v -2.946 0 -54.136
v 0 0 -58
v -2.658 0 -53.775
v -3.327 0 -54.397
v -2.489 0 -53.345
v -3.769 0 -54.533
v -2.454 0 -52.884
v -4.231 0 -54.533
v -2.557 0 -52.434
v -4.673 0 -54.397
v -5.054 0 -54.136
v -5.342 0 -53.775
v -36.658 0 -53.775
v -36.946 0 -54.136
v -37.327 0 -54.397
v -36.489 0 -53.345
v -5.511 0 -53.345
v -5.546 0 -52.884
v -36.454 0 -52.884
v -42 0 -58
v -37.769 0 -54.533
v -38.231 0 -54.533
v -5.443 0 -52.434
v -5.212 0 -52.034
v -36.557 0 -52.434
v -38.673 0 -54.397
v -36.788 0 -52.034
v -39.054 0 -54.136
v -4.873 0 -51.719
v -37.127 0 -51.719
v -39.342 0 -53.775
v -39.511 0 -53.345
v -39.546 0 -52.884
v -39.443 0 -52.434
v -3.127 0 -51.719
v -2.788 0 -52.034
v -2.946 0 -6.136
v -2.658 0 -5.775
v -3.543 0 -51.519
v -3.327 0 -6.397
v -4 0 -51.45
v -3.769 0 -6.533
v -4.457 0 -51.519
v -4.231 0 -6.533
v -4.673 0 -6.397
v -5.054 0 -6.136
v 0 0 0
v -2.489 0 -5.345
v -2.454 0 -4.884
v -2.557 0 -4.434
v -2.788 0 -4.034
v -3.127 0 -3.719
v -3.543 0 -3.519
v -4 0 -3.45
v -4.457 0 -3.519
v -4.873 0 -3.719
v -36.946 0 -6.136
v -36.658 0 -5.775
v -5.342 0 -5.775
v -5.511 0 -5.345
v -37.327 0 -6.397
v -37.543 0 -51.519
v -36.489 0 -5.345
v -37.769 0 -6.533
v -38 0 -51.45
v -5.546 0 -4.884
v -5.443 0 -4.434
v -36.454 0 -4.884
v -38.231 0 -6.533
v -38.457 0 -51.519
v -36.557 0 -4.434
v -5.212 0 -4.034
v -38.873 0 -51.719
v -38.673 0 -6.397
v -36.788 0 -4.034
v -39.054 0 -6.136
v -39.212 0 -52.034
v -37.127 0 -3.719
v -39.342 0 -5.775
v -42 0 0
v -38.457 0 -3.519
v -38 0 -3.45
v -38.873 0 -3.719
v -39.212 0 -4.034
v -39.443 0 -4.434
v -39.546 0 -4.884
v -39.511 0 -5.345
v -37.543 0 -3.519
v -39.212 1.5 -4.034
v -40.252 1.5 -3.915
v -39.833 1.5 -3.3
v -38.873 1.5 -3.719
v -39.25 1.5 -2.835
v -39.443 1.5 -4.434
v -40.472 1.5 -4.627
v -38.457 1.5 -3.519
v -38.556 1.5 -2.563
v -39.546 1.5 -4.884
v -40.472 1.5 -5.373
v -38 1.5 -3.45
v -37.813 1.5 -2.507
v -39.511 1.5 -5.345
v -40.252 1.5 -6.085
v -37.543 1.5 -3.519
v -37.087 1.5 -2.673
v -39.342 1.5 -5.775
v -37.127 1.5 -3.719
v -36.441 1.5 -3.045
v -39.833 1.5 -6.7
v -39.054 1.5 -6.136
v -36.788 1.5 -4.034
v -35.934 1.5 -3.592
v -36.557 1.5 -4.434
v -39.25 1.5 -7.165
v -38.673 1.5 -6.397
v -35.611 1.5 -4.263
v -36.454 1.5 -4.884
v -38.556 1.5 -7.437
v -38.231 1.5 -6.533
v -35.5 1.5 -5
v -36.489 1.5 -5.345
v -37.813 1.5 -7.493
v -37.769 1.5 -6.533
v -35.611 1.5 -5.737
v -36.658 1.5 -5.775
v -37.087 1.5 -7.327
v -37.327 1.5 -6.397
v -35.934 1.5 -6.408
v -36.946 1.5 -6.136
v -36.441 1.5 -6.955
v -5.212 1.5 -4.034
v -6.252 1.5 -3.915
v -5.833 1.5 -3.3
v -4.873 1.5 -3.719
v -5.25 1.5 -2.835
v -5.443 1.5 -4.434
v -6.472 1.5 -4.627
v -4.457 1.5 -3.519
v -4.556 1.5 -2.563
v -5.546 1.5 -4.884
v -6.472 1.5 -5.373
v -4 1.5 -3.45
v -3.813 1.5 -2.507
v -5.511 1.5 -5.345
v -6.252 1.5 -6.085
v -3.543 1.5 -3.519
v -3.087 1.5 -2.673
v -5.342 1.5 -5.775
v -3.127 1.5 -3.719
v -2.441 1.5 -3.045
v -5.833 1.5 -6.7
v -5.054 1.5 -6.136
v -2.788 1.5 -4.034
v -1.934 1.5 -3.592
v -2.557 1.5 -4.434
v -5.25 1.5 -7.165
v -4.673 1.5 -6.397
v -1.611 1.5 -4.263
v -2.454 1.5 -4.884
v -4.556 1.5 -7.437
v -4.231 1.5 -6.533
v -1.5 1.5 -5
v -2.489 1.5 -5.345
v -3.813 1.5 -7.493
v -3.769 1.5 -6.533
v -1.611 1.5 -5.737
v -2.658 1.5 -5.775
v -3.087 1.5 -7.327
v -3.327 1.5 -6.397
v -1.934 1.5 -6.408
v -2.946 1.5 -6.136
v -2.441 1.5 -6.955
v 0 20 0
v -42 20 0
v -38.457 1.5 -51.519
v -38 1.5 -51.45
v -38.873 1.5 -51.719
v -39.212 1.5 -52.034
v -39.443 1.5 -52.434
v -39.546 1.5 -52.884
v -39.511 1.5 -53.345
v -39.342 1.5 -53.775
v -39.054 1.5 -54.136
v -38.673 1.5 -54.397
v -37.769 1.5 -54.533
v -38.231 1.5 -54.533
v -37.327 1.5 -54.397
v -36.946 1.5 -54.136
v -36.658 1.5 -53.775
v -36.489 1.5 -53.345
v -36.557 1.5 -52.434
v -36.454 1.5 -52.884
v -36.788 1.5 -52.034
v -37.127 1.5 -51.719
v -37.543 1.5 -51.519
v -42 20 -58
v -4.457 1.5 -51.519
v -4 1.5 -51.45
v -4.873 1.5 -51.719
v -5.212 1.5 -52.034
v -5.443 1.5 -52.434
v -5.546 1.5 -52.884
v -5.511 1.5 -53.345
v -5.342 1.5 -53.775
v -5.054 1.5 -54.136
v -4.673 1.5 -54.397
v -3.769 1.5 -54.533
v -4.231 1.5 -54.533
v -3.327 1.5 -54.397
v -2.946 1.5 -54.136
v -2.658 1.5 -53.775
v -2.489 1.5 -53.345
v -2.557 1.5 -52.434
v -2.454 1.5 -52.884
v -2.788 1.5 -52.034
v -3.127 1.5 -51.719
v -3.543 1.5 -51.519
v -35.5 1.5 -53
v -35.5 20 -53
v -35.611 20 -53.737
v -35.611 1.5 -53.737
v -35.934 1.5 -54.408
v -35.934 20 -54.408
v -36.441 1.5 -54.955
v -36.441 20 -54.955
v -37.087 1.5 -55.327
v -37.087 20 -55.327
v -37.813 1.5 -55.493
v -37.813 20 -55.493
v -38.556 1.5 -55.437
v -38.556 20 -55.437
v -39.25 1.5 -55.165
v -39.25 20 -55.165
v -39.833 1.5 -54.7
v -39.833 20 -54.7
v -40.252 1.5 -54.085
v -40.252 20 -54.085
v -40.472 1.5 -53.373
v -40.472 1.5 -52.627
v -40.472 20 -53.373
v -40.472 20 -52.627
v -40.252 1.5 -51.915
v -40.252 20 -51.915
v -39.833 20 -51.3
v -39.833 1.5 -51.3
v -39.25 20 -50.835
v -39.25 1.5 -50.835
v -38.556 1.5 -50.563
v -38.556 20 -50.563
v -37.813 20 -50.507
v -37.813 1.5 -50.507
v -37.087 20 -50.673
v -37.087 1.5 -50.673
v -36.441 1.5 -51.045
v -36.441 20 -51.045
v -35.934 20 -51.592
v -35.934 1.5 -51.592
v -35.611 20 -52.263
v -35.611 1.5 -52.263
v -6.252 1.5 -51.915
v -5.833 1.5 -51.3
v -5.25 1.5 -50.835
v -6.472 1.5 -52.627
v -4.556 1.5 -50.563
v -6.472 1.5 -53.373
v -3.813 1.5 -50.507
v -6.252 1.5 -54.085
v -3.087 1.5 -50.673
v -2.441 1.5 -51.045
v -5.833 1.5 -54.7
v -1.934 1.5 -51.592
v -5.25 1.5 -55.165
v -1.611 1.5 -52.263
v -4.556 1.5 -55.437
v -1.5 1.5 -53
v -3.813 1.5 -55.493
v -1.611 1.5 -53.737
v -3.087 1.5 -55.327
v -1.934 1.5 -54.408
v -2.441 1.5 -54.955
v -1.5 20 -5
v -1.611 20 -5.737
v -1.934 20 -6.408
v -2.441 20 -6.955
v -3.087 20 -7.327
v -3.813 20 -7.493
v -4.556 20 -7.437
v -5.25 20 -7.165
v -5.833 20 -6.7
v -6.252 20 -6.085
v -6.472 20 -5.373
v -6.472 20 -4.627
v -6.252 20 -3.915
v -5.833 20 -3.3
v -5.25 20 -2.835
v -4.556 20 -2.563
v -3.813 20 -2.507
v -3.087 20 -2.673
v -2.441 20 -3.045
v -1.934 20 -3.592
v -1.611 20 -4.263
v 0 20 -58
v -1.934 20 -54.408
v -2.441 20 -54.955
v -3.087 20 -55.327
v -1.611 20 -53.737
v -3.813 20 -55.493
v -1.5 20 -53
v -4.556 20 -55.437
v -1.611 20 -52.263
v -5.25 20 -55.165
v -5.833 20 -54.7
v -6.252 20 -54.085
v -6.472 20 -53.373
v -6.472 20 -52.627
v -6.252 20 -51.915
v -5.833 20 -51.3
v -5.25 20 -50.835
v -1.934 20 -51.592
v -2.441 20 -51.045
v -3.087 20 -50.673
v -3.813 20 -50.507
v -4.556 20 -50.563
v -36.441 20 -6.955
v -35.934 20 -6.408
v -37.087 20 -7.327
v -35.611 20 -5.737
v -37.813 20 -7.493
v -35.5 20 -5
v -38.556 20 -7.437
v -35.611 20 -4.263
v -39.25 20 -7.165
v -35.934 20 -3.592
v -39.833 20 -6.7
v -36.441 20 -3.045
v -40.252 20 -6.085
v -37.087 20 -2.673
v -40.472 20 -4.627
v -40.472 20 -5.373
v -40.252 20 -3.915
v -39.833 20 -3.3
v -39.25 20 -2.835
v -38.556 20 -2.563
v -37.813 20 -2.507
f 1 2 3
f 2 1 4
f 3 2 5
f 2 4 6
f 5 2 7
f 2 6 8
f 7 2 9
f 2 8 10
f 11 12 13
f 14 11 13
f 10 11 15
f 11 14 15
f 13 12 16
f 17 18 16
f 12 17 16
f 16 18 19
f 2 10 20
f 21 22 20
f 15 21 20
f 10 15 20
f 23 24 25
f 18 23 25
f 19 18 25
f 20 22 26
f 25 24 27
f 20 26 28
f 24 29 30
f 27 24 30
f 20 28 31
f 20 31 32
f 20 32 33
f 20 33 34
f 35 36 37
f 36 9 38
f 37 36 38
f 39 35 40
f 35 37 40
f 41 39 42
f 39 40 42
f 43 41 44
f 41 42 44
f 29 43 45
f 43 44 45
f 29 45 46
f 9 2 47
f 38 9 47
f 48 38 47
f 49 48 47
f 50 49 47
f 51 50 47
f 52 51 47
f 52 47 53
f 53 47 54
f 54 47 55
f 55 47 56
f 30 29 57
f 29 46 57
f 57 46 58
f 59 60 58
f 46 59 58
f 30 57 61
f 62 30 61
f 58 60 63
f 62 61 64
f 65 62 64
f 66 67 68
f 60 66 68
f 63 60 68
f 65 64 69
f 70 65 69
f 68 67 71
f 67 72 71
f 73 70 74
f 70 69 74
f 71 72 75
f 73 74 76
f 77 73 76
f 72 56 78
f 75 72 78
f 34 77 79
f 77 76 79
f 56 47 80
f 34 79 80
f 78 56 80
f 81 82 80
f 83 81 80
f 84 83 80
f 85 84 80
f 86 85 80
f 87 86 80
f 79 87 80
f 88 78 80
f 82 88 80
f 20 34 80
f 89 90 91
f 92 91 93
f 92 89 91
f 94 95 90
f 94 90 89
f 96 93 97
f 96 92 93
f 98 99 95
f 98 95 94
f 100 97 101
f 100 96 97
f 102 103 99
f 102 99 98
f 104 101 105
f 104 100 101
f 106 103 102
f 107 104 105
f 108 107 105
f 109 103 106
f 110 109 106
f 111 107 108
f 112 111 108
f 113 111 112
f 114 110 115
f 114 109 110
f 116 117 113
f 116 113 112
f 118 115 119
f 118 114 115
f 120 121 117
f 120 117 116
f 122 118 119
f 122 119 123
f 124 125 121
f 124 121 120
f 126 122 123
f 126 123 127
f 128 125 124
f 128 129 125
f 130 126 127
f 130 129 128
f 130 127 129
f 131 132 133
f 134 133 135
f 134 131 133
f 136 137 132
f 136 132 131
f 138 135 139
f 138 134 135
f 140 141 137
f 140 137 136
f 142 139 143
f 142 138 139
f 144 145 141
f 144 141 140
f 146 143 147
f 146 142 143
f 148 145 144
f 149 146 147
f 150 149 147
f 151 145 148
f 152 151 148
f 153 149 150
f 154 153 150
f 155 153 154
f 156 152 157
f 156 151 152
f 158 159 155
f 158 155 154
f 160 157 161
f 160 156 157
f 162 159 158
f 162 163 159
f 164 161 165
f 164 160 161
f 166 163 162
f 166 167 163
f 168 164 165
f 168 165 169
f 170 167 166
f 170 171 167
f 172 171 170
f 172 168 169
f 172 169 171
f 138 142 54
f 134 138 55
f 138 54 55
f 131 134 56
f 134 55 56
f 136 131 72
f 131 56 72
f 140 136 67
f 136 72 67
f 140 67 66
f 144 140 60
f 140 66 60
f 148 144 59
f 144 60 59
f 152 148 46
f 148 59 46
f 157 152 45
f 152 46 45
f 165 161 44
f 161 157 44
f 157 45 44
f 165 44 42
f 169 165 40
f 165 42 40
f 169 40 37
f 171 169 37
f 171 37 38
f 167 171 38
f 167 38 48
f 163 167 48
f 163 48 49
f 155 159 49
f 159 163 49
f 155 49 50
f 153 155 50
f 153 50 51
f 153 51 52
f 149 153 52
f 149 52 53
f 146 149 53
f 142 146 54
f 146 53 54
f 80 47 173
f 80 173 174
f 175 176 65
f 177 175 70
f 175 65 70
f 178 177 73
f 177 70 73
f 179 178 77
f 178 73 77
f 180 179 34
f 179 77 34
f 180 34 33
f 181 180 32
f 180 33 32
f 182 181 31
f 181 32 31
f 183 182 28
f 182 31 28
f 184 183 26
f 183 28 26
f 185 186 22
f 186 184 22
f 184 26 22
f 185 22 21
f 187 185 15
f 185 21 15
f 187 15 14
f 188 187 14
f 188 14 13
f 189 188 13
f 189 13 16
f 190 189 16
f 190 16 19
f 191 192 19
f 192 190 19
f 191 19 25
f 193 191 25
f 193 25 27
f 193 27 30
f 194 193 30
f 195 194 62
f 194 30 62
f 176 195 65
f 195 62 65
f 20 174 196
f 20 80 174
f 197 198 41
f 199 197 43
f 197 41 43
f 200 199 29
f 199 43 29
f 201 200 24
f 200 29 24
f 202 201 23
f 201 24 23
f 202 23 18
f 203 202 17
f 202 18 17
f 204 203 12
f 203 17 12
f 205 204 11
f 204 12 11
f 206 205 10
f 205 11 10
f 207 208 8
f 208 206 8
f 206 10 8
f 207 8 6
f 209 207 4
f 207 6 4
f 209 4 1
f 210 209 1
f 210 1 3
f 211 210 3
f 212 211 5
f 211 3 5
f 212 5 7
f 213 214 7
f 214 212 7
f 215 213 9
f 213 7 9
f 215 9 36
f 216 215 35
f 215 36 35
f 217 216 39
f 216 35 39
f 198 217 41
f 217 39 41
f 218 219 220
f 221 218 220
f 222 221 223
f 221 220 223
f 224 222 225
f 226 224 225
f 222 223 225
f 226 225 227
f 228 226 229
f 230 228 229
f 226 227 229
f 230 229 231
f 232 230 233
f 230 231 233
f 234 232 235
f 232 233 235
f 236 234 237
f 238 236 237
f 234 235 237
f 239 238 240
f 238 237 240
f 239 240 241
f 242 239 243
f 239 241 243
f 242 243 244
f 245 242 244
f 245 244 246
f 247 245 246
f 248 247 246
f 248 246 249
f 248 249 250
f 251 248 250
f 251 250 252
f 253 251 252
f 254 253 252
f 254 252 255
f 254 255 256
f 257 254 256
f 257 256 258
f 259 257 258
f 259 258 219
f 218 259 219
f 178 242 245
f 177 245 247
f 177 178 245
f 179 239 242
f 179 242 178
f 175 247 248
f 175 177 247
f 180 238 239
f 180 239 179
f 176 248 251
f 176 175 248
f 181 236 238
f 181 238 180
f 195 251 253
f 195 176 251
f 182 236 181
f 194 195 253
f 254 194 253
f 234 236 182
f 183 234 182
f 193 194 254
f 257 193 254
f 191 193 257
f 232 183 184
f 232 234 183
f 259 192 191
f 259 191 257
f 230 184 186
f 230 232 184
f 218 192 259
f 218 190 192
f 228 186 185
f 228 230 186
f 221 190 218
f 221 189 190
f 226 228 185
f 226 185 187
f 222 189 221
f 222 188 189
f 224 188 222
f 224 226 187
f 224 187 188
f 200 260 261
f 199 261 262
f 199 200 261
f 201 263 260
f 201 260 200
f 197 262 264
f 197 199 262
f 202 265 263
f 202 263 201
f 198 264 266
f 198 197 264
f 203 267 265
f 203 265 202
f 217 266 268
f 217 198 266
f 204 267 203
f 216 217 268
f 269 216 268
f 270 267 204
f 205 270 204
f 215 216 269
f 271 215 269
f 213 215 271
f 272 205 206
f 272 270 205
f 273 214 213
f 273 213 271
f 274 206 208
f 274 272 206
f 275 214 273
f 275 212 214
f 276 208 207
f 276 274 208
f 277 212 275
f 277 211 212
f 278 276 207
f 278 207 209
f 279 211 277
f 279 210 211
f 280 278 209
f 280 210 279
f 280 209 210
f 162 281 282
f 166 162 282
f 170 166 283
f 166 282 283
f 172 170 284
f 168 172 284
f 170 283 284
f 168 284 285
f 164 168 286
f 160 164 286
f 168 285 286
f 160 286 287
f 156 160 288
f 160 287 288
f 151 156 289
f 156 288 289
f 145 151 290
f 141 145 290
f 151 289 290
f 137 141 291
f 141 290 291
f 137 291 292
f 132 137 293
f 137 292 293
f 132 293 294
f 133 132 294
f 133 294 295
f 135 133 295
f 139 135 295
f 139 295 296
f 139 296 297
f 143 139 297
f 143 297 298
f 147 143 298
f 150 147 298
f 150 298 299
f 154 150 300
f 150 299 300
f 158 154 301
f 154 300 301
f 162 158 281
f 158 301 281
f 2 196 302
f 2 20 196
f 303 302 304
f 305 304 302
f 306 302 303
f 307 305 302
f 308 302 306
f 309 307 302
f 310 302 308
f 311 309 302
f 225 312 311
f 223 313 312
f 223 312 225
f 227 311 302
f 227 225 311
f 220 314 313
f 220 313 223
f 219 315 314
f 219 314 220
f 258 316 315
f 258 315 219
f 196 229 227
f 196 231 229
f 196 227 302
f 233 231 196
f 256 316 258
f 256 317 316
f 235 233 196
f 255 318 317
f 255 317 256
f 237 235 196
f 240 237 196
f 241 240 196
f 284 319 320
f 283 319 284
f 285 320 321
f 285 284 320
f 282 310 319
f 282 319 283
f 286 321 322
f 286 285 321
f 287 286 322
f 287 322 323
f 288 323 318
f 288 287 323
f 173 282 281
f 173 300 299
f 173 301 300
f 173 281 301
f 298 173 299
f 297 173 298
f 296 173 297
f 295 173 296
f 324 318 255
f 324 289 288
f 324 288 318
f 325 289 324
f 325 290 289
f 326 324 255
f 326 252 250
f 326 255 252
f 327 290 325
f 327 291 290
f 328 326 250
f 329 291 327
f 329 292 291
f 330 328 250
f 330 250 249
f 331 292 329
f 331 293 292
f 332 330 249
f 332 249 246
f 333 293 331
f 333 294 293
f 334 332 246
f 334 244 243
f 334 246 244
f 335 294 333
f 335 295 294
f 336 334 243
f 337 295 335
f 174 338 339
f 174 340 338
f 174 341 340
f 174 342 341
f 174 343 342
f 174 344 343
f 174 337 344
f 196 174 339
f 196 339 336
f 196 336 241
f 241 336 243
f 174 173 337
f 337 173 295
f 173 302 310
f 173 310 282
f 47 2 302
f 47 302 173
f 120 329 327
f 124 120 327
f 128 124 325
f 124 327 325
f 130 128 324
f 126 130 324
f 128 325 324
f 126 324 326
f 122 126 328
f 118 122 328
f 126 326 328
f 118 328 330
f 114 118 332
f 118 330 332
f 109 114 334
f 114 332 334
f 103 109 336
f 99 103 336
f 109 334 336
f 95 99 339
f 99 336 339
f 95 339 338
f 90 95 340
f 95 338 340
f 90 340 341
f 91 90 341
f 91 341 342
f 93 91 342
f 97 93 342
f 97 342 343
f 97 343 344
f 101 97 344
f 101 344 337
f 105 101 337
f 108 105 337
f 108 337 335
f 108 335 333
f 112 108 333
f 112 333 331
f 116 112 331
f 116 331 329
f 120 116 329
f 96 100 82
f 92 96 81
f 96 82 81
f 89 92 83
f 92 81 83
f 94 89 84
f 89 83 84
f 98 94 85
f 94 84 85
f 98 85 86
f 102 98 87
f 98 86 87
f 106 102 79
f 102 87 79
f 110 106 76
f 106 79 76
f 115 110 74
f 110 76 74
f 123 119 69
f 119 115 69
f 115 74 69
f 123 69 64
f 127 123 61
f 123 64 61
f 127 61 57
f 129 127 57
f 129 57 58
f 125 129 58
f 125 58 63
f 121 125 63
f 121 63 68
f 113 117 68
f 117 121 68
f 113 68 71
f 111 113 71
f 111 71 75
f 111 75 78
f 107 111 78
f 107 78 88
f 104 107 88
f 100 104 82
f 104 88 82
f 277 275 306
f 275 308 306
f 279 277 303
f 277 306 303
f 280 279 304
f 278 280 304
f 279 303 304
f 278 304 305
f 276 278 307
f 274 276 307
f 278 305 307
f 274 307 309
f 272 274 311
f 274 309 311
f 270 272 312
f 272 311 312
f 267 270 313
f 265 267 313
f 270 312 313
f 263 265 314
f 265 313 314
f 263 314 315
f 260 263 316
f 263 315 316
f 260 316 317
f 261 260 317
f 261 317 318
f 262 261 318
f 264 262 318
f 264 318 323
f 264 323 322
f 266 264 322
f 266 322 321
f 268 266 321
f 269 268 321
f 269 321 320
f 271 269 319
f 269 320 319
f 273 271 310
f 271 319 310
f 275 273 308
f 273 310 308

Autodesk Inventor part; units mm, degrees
ref_plane "YZ Plane" through (0, 0, 0) normal (1, 0, 0) x (0, 1, 0)
ref_plane "XZ Plane" through (0, 0, 0) normal (0, 1, 0) x (-1, 0, 0)
ref_plane "XY Plane" through (0, 0, 0) normal (0, 0, 1) x (1, 0, 0)
sketch "Sketch1" plane through (0, 0, 0) normal (0, 1, 0) x (-1, 0, 0)
  line L0 (0, 0) -> (42, 0)
  line L1 (42, 0) -> (42, -58)
  line L2 (42, -58) -> (0, -58)
  line L3 (0, -58) -> (0, 0)
  dimension "d0" = 58
  dimension "d1" = 42
extrude "Extrusion1" add sketch "Sketch1" along normal blind 20
sketch "Sketch2" plane through (0, 20, 0) normal (0, 1, 0) x (1, 0, 0)
  line L0 (-29.2926, 35.5201) -> (-17.3649, 35.5201) construction
  line L1 (-17.3649, 35.5201) -> (-17.3649, 9.1969) construction
  line L2 (-17.3649, 9.1969) -> (-29.2926, 9.1969) construction
  line L3 (-29.2926, 9.1969) -> (-29.2926, 35.5201) construction
  spline S0 degree 2 poles (-27.9624, 31.884) (-28.3424, 31.884) (-28.8757, 32.0428) (-29.1111, 32.1562) knots 0 0 0 1 2 2 2
  line L4 (-29.1111, 32.1562) -> (-29.1111, 32.7405)
  line L5 (-29.1111, 32.7405) -> (-29.077, 32.7405)
  spline S1 degree 2 poles (-29.077, 32.7405) (-28.8473, 32.525) (-28.2658, 32.2867) (-27.9964, 32.2867) knots 0 0 0 1 2 2 2
  spline S2 degree 2 poles (-27.9964, 32.2867) (-27.6107, 32.2867) (-27.2164, 32.6072) (-27.2164, 32.871) knots 0 0 0 1 2 2 2
  spline S3 degree 2 poles (-27.2164, 32.871) (-27.2164, 33.0809) (-27.4235, 33.3418) (-27.6475, 33.4071) knots 0 0 0 1 2 2 2
  spline S4 degree 2 poles (-27.6475, 33.4071) (-27.8092, 33.4524) (-28.0787, 33.5148) (-28.28, 33.5659) knots 0 0 0 1 2 2 2
  spline S5 degree 2 poles (-28.28, 33.5659) (-28.4616, 33.6141) (-28.748, 33.7588) (-28.8586, 33.875) knots 0 0 0 1 2 2 2
  spline S6 degree 2 poles (-28.8586, 33.875) (-28.9664, 33.9913) (-29.0855, 34.3033) (-29.0855, 34.5075) knots 0 0 0 1 2 2 2
  spline S7 degree 2 poles (-29.0855, 34.5075) (-29.0855, 34.933) (-28.4218, 35.5088) (-27.9085, 35.5088) knots 0 0 0 1 2 2 2
  spline S8 degree 2 poles (-27.9085, 35.5088) (-27.6135, 35.5088) (-27.0916, 35.3925) (-26.8675, 35.2819) knots 0 0 0 1 2 2 2
  line L6 (-26.8675, 35.2819) -> (-26.8675, 34.7259)
  line L7 (-26.8675, 34.7259) -> (-26.9016, 34.7259)
  spline S9 degree 2 poles (-26.9016, 34.7259) (-27.0689, 34.8791) (-27.5908, 35.106) (-27.8773, 35.106) knots 0 0 0 1 2 2 2
  spline S10 degree 2 poles (-27.8773, 35.106) (-28.2006, 35.106) (-28.6005, 34.8025) (-28.6005, 34.5558) knots 0 0 0 1 2 2 2
  spline S11 degree 2 poles (-28.6005, 34.5558) (-28.6005, 34.3345) (-28.3651, 34.0707) (-28.1439, 34.0112) knots 0 0 0 1 2 2 2
  spline S12 degree 2 poles (-28.1439, 34.0112) (-27.9964, 33.9715) (-27.5681, 33.8694) (-27.4263, 33.8268) knots 0 0 0 1 2 2 2
  spline S13 degree 2 poles (-27.4263, 33.8268) (-27.0661, 33.7162) (-26.7314, 33.2709) (-26.7314, 32.9447) knots 0 0 0 1 2 2 2
  spline S14 degree 2 poles (-26.7314, 32.9447) (-26.7314, 32.7377) (-26.8987, 32.3406) (-27.0491, 32.2016) knots 0 0 0 1 2 2 2
  spline S15 degree 2 poles (-27.0491, 32.2016) (-27.2164, 32.0485) (-27.6419, 31.884) (-27.9624, 31.884) knots 0 0 0 1 2 2 2
  line L8 (-26.2577, 31.9464) -> (-26.2577, 35.4464)
  line L9 (-26.2577, 35.4464) -> (-24.0681, 35.4464)
  line L10 (-24.0681, 35.4464) -> (-24.0681, 35.0323)
  line L11 (-24.0681, 35.0323) -> (-25.7926, 35.0323)
  line L12 (-25.7926, 35.0323) -> (-25.7926, 34.0736)
  line L13 (-25.7926, 34.0736) -> (-24.1844, 34.0736)
  line L14 (-24.1844, 34.0736) -> (-24.1844, 33.6595)
  line L15 (-24.1844, 33.6595) -> (-25.7926, 33.6595)
  line L16 (-25.7926, 33.6595) -> (-25.7926, 32.3605)
  line L17 (-25.7926, 32.3605) -> (-24.0681, 32.3605)
  line L18 (-24.0681, 32.3605) -> (-24.0681, 31.9464)
  line L19 (-24.0681, 31.9464) -> (-26.2577, 31.9464)
  line L20 (-20.8489, 31.9464) -> (-21.453, 31.9464)
  line L21 (-21.453, 31.9464) -> (-22.5592, 33.339)
  line L22 (-22.5592, 33.339) -> (-23.0924, 33.339)
  line L23 (-23.0924, 33.339) -> (-23.0924, 31.9464)
  line L24 (-23.0924, 31.9464) -> (-23.5576, 31.9464)
  line L25 (-23.5576, 31.9464) -> (-23.5576, 35.4464)
  line L26 (-23.5576, 35.4464) -> (-22.6556, 35.4464)
  spline S16 degree 2 poles (-22.6556, 35.4464) (-22.355, 35.4464) (-21.9494, 35.3811) (-21.765, 35.262) knots 0 0 0 1 2 2 2
  spline S17 degree 2 poles (-21.765, 35.262) (-21.5807, 35.1429) (-21.368, 34.7713) (-21.368, 34.4962) knots 0 0 0 1 2 2 2
  spline S18 degree 2 poles (-21.368, 34.4962) (-21.368, 34.1133) (-21.7594, 33.5943) (-22.094, 33.4695) knots 0 0 0 1 2 2 2
  line L27 (-22.094, 33.4695) -> (-20.8489, 31.9464)
  spline S19 degree 2 poles (-21.853, 34.4593) (-21.853, 34.6125) (-21.9607, 34.8479) (-22.0742, 34.9245) knots 0 0 0 1 2 2 2
  spline S20 degree 2 poles (-22.0742, 34.9245) (-22.1735, 34.9897) (-22.4372, 35.0436) (-22.6301, 35.0436) knots 0 0 0 1 2 2 2
  line L28 (-22.6301, 35.0436) -> (-23.0924, 35.0436)
  line L29 (-23.0924, 35.0436) -> (-23.0924, 33.7276)
  line L30 (-23.0924, 33.7276) -> (-22.684, 33.7276)
  spline S21 degree 2 poles (-22.684, 33.7276) (-22.4826, 33.7276) (-22.1621, 33.7985) (-22.0515, 33.9091) knots 0 0 0 1 2 2 2
  spline S22 degree 2 poles (-22.0515, 33.9091) (-21.9494, 34.0055) (-21.853, 34.2778) (-21.853, 34.4593) knots 0 0 0 1 2 2 2
  line L31 (-18.0325, 35.4464) -> (-19.2379, 31.9464)
  line L32 (-19.2379, 31.9464) -> (-19.7399, 31.9464)
  line L33 (-19.7399, 31.9464) -> (-20.9453, 35.4464)
  line L34 (-20.9453, 35.4464) -> (-20.4462, 35.4464)
  line L35 (-20.4462, 35.4464) -> (-19.4761, 32.5391)
  line L36 (-19.4761, 32.5391) -> (-18.5061, 35.4464)
  line L37 (-18.5061, 35.4464) -> (-18.0325, 35.4464)
  spline S23 degree 2 poles (-15.2217, 35.0464) (-15.0231, 34.8139) (-14.8019, 34.1331) (-14.8019, 33.6964) knots 0 0 0 1 2 2 2
  spline S24 degree 2 poles (-14.8019, 33.6964) (-14.8019, 33.2709) (-15.0175, 32.5817) (-15.2217, 32.3491) knots 0 0 0 1 2 2 2
  spline S25 degree 2 poles (-15.2217, 32.3491) (-15.4372, 32.1052) (-16.0073, 31.8726) (-16.3505, 31.8726) knots 0 0 0 1 2 2 2
  spline S26 degree 2 poles (-16.3505, 31.8726) (-16.7051, 31.8726) (-17.2723, 32.1137) (-17.4794, 32.3491) knots 0 0 0 1 2 2 2
  spline S27 degree 2 poles (-17.4794, 32.3491) (-17.6808, 32.5817) (-17.8963, 33.2652) (-17.8963, 33.6964) knots 0 0 0 1 2 2 2
  spline S28 degree 2 poles (-17.8963, 33.6964) (-17.8963, 34.136) (-17.6779, 34.8054) (-17.4765, 35.0464) knots 0 0 0 1 2 2 2
  spline S29 degree 2 poles (-17.4765, 35.0464) (-17.2723, 35.279) (-16.7022, 35.5201) (-16.3505, 35.5201) knots 0 0 0 1 2 2 2
  spline S30 degree 2 poles (-16.3505, 35.5201) (-15.9932, 35.5201) (-15.4202, 35.2705) (-15.2217, 35.0464) knots 0 0 0 1 2 2 2
  spline S31 degree 2 poles (-15.2869, 33.6964) (-15.2869, 34.0424) (-15.4372, 34.5784) (-15.5734, 34.7543) knots 0 0 0 1 2 2 2
  spline S32 degree 2 poles (-15.5734, 34.7543) (-15.7124, 34.9358) (-16.1038, 35.1173) (-16.3477, 35.1173) knots 0 0 0 1 2 2 2
  spline S33 degree 2 poles (-16.3477, 35.1173) (-16.6001, 35.1173) (-16.9802, 34.9415) (-17.1248, 34.7543) knots 0 0 0 1 2 2 2
  spline S34 degree 2 poles (-17.1248, 34.7543) (-17.2638, 34.5756) (-17.4113, 34.0367) (-17.4113, 33.6964) knots 0 0 0 1 2 2 2
  spline S35 degree 2 poles (-17.4113, 33.6964) (-17.4113, 33.0071) (-16.8327, 32.2754) (-16.3477, 32.2754) knots 0 0 0 1 2 2 2
  spline S36 degree 2 poles (-16.3477, 32.2754) (-15.8627, 32.2754) (-15.2869, 33.0071) (-15.2869, 33.6964) knots 0 0 0 1 2 2 2
  spline S37 degree 2 poles (-26.1783, 27.9309) (-26.1783, 27.4515) (-26.5669, 26.6801) (-26.8931, 26.4645) knots 0 0 0 1 2 2 2
  spline S38 degree 2 poles (-26.8931, 26.4645) (-27.1597, 26.2972) (-27.7071, 26.1837) (-28.1325, 26.1837) knots 0 0 0 1 2 2 2
  line L38 (-28.1325, 26.1837) -> (-28.9381, 26.1837)
  line L39 (-28.9381, 26.1837) -> (-28.9381, 29.6837)
  line L40 (-28.9381, 29.6837) -> (-28.141, 29.6837)
  spline S39 degree 2 poles (-28.141, 29.6837) (-27.6475, 29.6837) (-27.0859, 29.5362) (-26.8874, 29.4057) knots 0 0 0 1 2 2 2
  spline S40 degree 2 poles (-26.8874, 29.4057) (-26.5499, 29.1817) (-26.1783, 28.4414) (-26.1783, 27.9309) knots 0 0 0 1 2 2 2
  spline S41 degree 2 poles (-26.6633, 27.9365) (-26.6633, 28.3393) (-26.9299, 28.9094) (-27.1937, 29.0711) knots 0 0 0 1 2 2 2
  spline S42 degree 2 poles (-27.1937, 29.0711) (-27.3809, 29.1817) (-27.8035, 29.2809) (-28.1184, 29.2809) knots 0 0 0 1 2 2 2
  line L41 (-28.1184, 29.2809) -> (-28.4729, 29.2809)
  line L42 (-28.4729, 29.2809) -> (-28.4729, 26.5865)
  line L43 (-28.4729, 26.5865) -> (-28.1184, 26.5865)
  spline S43 degree 2 poles (-28.1184, 26.5865) (-27.8092, 26.5865) (-27.3412, 26.6857) (-27.1512, 26.819) knots 0 0 0 1 2 2 2
  spline S44 degree 2 poles (-27.1512, 26.819) (-26.9073, 26.9835) (-26.6633, 27.5281) (-26.6633, 27.9365) knots 0 0 0 1 2 2 2
  line L44 (-22.9648, 26.1837) -> (-23.5689, 26.1837)
  line L45 (-23.5689, 26.1837) -> (-24.6751, 27.5763)
  line L46 (-24.6751, 27.5763) -> (-25.2083, 27.5763)
  line L47 (-25.2083, 27.5763) -> (-25.2083, 26.1837)
  line L48 (-25.2083, 26.1837) -> (-25.6735, 26.1837)
  line L49 (-25.6735, 26.1837) -> (-25.6735, 29.6837)
  line L50 (-25.6735, 29.6837) -> (-24.7715, 29.6837)
  spline S45 degree 2 poles (-24.7715, 29.6837) (-24.4709, 29.6837) (-24.0653, 29.6185) (-23.8809, 29.4993) knots 0 0 0 1 2 2 2
  spline S46 degree 2 poles (-23.8809, 29.4993) (-23.6966, 29.3802) (-23.4838, 29.0087) (-23.4838, 28.7335) knots 0 0 0 1 2 2 2
  spline S47 degree 2 poles (-23.4838, 28.7335) (-23.4838, 28.3506) (-23.8752, 27.8316) (-24.2099, 27.7068) knots 0 0 0 1 2 2 2
  line L51 (-24.2099, 27.7068) -> (-22.9648, 26.1837)
  spline S48 degree 2 poles (-23.9688, 28.6967) (-23.9688, 28.8498) (-24.0766, 29.0852) (-24.1901, 29.1618) knots 0 0 0 1 2 2 2
  spline S49 degree 2 poles (-24.1901, 29.1618) (-24.2893, 29.2271) (-24.5531, 29.2809) (-24.746, 29.2809) knots 0 0 0 1 2 2 2
  line L52 (-24.746, 29.2809) -> (-25.2083, 29.2809)
  line L53 (-25.2083, 29.2809) -> (-25.2083, 27.9649)
  line L54 (-25.2083, 27.9649) -> (-24.7999, 27.9649)
  spline S50 degree 2 poles (-24.7999, 27.9649) (-24.5985, 27.9649) (-24.278, 28.0358) (-24.1674, 28.1464) knots 0 0 0 1 2 2 2
  spline S51 degree 2 poles (-24.1674, 28.1464) (-24.0653, 28.2429) (-23.9688, 28.5151) (-23.9688, 28.6967) knots 0 0 0 1 2 2 2
  line L55 (-21.4672, 26.1837) -> (-22.823, 26.1837)
  line L56 (-22.823, 26.1837) -> (-22.823, 26.5411)
  line L57 (-22.823, 26.5411) -> (-22.3777, 26.5411)
  line L58 (-22.3777, 26.5411) -> (-22.3777, 29.3263)
  line L59 (-22.3777, 29.3263) -> (-22.823, 29.3263)
  line L60 (-22.823, 29.3263) -> (-22.823, 29.6837)
  line L61 (-22.823, 29.6837) -> (-21.4672, 29.6837)
  line L62 (-21.4672, 29.6837) -> (-21.4672, 29.3263)
  line L63 (-21.4672, 29.3263) -> (-21.9125, 29.3263)
  line L64 (-21.9125, 29.3263) -> (-21.9125, 26.5411)
  line L65 (-21.9125, 26.5411) -> (-21.4672, 26.5411)
  line L66 (-21.4672, 26.5411) -> (-21.4672, 26.1837)
  line L67 (-18.353, 29.6837) -> (-19.5584, 26.1837)
  line L68 (-19.5584, 26.1837) -> (-20.0604, 26.1837)
  line L69 (-20.0604, 26.1837) -> (-21.2658, 29.6837)
  line L70 (-21.2658, 29.6837) -> (-20.7667, 29.6837)
  line L71 (-20.7667, 29.6837) -> (-19.7966, 26.7765)
  line L72 (-19.7966, 26.7765) -> (-18.8266, 29.6837)
  line L73 (-18.8266, 29.6837) -> (-18.353, 29.6837)
  line L74 (-18.0183, 26.1837) -> (-18.0183, 29.6837)
  line L75 (-18.0183, 29.6837) -> (-15.8287, 29.6837)
  line L76 (-15.8287, 29.6837) -> (-15.8287, 29.2696)
  line L77 (-15.8287, 29.2696) -> (-17.5531, 29.2696)
  line L78 (-17.5531, 29.2696) -> (-17.5531, 28.3109)
  line L79 (-17.5531, 28.3109) -> (-15.9449, 28.3109)
  line L80 (-15.9449, 28.3109) -> (-15.9449, 27.8968)
  line L81 (-15.9449, 27.8968) -> (-17.5531, 27.8968)
  line L82 (-17.5531, 27.8968) -> (-17.5531, 26.5978)
  line L83 (-17.5531, 26.5978) -> (-15.8287, 26.5978)
  line L84 (-15.8287, 26.5978) -> (-15.8287, 26.1837)
  line L85 (-15.8287, 26.1837) -> (-18.0183, 26.1837)
  line L86 (-12.6094, 26.1837) -> (-13.2136, 26.1837)
  line L87 (-13.2136, 26.1837) -> (-14.3197, 27.5763)
  line L88 (-14.3197, 27.5763) -> (-14.853, 27.5763)
  line L89 (-14.853, 27.5763) -> (-14.853, 26.1837)
  line L90 (-14.853, 26.1837) -> (-15.3181, 26.1837)
  line L91 (-15.3181, 26.1837) -> (-15.3181, 29.6837)
  line L92 (-15.3181, 29.6837) -> (-14.4162, 29.6837)
  spline S52 degree 2 poles (-14.4162, 29.6837) (-14.1155, 29.6837) (-13.7099, 29.6185) (-13.5256, 29.4993) knots 0 0 0 1 2 2 2
  spline S53 degree 2 poles (-13.5256, 29.4993) (-13.3412, 29.3802) (-13.1285, 29.0087) (-13.1285, 28.7335) knots 0 0 0 1 2 2 2
  spline S54 degree 2 poles (-13.1285, 28.7335) (-13.1285, 28.3506) (-13.5199, 27.8316) (-13.8546, 27.7068) knots 0 0 0 1 2 2 2
  line L93 (-13.8546, 27.7068) -> (-12.6094, 26.1837)
  spline S55 degree 2 poles (-13.6135, 28.6967) (-13.6135, 28.8498) (-13.7213, 29.0852) (-13.8347, 29.1618) knots 0 0 0 1 2 2 2
  spline S56 degree 2 poles (-13.8347, 29.1618) (-13.934, 29.2271) (-14.1978, 29.2809) (-14.3906, 29.2809) knots 0 0 0 1 2 2 2
  line L94 (-14.3906, 29.2809) -> (-14.853, 29.2809)
  line L95 (-14.853, 29.2809) -> (-14.853, 27.9649)
  line L96 (-14.853, 27.9649) -> (-14.4445, 27.9649)
  spline S57 degree 2 poles (-14.4445, 27.9649) (-14.2432, 27.9649) (-13.9227, 28.0358) (-13.812, 28.1464) knots 0 0 0 1 2 2 2
  spline S58 degree 2 poles (-13.812, 28.1464) (-13.7099, 28.2429) (-13.6135, 28.5151) (-13.6135, 28.6967) knots 0 0 0 1 2 2 2
  point P0 (0, 0)
extrude "Extrusion2" add sketch "Sketch2" against normal blind 1
sketch "Sketch5" plane through (0, 20, 0) normal (0, 1, 0) x (1, 0, 0)
  circle A0 centre (-4, 53) radius 1.55
  circle A1 centre (-38, 53) radius 1.55
  circle A2 centre (-38, 5) radius 1.55
  circle A3 centre (-4, 5) radius 1.55
  line L0 (-42, 58) -> (-42, 0) projected
  line L1 (-42, 0) -> (0, 0) projected
  dimension "d6" = 3.1
  dimension "d7" = 3.1
  dimension "d8" = 3.1
  dimension "d9" = 3.1
  dimension "d10" = 34
  dimension "d11" = 48
  dimension "d12" = 48
  dimension "d13" = 34
  dimension "d14" = 0
  dimension "d15" = 0
  dimension "d16" = 4
  dimension "d17" = 5
hole "Hole1" at (-38, 20, -53) at (-38, 20, -5) at (-4, 20, -5) at (-4, 20, -53) direction (0, -1, 0) diameter 3.1 end through all
sketch "Sketch6" plane through (0, 20, 0) normal (0, 1, 0) x (1, 0, 0)
  circle A0 centre (-4, 5) radius 2.5
  circle A1 centre (-4, 53) radius 2.5
  circle A2 centre (-38, 53) radius 2.5
  circle A3 centre (-38, 5) radius 2.5
  circle A4 centre (-4, 5) radius 1.55 projected
  circle A5 centre (-38, 5) radius 1.55 projected
  circle A6 centre (-38, 53) radius 1.55 projected
  circle A7 centre (-4, 53) radius 1.55 projected
  circle A8 centre (-4, 53) radius 1.55
  circle A9 centre (-38, 5) radius 1.55
  circle A10 centre (-4, 5) radius 1.55
  circle A11 centre (-38, 53) radius 1.55
  point P0 (0, 0)
  dimension "d25" = 5
  dimension "d26" = 5
  dimension "d27" = 5
  dimension "d28" = 5
  dimension "d29" = 3.1
  dimension "d30" = 3.1
  dimension "d31" = 3.1
  dimension "d32" = 3.1
extrude "Extrusion3" cut sketch "Sketch6" against normal blind 18.5
equation "\"d12\" = d11"
equation "\"d13\" = d10"
properties part number "Servo_Driver"
